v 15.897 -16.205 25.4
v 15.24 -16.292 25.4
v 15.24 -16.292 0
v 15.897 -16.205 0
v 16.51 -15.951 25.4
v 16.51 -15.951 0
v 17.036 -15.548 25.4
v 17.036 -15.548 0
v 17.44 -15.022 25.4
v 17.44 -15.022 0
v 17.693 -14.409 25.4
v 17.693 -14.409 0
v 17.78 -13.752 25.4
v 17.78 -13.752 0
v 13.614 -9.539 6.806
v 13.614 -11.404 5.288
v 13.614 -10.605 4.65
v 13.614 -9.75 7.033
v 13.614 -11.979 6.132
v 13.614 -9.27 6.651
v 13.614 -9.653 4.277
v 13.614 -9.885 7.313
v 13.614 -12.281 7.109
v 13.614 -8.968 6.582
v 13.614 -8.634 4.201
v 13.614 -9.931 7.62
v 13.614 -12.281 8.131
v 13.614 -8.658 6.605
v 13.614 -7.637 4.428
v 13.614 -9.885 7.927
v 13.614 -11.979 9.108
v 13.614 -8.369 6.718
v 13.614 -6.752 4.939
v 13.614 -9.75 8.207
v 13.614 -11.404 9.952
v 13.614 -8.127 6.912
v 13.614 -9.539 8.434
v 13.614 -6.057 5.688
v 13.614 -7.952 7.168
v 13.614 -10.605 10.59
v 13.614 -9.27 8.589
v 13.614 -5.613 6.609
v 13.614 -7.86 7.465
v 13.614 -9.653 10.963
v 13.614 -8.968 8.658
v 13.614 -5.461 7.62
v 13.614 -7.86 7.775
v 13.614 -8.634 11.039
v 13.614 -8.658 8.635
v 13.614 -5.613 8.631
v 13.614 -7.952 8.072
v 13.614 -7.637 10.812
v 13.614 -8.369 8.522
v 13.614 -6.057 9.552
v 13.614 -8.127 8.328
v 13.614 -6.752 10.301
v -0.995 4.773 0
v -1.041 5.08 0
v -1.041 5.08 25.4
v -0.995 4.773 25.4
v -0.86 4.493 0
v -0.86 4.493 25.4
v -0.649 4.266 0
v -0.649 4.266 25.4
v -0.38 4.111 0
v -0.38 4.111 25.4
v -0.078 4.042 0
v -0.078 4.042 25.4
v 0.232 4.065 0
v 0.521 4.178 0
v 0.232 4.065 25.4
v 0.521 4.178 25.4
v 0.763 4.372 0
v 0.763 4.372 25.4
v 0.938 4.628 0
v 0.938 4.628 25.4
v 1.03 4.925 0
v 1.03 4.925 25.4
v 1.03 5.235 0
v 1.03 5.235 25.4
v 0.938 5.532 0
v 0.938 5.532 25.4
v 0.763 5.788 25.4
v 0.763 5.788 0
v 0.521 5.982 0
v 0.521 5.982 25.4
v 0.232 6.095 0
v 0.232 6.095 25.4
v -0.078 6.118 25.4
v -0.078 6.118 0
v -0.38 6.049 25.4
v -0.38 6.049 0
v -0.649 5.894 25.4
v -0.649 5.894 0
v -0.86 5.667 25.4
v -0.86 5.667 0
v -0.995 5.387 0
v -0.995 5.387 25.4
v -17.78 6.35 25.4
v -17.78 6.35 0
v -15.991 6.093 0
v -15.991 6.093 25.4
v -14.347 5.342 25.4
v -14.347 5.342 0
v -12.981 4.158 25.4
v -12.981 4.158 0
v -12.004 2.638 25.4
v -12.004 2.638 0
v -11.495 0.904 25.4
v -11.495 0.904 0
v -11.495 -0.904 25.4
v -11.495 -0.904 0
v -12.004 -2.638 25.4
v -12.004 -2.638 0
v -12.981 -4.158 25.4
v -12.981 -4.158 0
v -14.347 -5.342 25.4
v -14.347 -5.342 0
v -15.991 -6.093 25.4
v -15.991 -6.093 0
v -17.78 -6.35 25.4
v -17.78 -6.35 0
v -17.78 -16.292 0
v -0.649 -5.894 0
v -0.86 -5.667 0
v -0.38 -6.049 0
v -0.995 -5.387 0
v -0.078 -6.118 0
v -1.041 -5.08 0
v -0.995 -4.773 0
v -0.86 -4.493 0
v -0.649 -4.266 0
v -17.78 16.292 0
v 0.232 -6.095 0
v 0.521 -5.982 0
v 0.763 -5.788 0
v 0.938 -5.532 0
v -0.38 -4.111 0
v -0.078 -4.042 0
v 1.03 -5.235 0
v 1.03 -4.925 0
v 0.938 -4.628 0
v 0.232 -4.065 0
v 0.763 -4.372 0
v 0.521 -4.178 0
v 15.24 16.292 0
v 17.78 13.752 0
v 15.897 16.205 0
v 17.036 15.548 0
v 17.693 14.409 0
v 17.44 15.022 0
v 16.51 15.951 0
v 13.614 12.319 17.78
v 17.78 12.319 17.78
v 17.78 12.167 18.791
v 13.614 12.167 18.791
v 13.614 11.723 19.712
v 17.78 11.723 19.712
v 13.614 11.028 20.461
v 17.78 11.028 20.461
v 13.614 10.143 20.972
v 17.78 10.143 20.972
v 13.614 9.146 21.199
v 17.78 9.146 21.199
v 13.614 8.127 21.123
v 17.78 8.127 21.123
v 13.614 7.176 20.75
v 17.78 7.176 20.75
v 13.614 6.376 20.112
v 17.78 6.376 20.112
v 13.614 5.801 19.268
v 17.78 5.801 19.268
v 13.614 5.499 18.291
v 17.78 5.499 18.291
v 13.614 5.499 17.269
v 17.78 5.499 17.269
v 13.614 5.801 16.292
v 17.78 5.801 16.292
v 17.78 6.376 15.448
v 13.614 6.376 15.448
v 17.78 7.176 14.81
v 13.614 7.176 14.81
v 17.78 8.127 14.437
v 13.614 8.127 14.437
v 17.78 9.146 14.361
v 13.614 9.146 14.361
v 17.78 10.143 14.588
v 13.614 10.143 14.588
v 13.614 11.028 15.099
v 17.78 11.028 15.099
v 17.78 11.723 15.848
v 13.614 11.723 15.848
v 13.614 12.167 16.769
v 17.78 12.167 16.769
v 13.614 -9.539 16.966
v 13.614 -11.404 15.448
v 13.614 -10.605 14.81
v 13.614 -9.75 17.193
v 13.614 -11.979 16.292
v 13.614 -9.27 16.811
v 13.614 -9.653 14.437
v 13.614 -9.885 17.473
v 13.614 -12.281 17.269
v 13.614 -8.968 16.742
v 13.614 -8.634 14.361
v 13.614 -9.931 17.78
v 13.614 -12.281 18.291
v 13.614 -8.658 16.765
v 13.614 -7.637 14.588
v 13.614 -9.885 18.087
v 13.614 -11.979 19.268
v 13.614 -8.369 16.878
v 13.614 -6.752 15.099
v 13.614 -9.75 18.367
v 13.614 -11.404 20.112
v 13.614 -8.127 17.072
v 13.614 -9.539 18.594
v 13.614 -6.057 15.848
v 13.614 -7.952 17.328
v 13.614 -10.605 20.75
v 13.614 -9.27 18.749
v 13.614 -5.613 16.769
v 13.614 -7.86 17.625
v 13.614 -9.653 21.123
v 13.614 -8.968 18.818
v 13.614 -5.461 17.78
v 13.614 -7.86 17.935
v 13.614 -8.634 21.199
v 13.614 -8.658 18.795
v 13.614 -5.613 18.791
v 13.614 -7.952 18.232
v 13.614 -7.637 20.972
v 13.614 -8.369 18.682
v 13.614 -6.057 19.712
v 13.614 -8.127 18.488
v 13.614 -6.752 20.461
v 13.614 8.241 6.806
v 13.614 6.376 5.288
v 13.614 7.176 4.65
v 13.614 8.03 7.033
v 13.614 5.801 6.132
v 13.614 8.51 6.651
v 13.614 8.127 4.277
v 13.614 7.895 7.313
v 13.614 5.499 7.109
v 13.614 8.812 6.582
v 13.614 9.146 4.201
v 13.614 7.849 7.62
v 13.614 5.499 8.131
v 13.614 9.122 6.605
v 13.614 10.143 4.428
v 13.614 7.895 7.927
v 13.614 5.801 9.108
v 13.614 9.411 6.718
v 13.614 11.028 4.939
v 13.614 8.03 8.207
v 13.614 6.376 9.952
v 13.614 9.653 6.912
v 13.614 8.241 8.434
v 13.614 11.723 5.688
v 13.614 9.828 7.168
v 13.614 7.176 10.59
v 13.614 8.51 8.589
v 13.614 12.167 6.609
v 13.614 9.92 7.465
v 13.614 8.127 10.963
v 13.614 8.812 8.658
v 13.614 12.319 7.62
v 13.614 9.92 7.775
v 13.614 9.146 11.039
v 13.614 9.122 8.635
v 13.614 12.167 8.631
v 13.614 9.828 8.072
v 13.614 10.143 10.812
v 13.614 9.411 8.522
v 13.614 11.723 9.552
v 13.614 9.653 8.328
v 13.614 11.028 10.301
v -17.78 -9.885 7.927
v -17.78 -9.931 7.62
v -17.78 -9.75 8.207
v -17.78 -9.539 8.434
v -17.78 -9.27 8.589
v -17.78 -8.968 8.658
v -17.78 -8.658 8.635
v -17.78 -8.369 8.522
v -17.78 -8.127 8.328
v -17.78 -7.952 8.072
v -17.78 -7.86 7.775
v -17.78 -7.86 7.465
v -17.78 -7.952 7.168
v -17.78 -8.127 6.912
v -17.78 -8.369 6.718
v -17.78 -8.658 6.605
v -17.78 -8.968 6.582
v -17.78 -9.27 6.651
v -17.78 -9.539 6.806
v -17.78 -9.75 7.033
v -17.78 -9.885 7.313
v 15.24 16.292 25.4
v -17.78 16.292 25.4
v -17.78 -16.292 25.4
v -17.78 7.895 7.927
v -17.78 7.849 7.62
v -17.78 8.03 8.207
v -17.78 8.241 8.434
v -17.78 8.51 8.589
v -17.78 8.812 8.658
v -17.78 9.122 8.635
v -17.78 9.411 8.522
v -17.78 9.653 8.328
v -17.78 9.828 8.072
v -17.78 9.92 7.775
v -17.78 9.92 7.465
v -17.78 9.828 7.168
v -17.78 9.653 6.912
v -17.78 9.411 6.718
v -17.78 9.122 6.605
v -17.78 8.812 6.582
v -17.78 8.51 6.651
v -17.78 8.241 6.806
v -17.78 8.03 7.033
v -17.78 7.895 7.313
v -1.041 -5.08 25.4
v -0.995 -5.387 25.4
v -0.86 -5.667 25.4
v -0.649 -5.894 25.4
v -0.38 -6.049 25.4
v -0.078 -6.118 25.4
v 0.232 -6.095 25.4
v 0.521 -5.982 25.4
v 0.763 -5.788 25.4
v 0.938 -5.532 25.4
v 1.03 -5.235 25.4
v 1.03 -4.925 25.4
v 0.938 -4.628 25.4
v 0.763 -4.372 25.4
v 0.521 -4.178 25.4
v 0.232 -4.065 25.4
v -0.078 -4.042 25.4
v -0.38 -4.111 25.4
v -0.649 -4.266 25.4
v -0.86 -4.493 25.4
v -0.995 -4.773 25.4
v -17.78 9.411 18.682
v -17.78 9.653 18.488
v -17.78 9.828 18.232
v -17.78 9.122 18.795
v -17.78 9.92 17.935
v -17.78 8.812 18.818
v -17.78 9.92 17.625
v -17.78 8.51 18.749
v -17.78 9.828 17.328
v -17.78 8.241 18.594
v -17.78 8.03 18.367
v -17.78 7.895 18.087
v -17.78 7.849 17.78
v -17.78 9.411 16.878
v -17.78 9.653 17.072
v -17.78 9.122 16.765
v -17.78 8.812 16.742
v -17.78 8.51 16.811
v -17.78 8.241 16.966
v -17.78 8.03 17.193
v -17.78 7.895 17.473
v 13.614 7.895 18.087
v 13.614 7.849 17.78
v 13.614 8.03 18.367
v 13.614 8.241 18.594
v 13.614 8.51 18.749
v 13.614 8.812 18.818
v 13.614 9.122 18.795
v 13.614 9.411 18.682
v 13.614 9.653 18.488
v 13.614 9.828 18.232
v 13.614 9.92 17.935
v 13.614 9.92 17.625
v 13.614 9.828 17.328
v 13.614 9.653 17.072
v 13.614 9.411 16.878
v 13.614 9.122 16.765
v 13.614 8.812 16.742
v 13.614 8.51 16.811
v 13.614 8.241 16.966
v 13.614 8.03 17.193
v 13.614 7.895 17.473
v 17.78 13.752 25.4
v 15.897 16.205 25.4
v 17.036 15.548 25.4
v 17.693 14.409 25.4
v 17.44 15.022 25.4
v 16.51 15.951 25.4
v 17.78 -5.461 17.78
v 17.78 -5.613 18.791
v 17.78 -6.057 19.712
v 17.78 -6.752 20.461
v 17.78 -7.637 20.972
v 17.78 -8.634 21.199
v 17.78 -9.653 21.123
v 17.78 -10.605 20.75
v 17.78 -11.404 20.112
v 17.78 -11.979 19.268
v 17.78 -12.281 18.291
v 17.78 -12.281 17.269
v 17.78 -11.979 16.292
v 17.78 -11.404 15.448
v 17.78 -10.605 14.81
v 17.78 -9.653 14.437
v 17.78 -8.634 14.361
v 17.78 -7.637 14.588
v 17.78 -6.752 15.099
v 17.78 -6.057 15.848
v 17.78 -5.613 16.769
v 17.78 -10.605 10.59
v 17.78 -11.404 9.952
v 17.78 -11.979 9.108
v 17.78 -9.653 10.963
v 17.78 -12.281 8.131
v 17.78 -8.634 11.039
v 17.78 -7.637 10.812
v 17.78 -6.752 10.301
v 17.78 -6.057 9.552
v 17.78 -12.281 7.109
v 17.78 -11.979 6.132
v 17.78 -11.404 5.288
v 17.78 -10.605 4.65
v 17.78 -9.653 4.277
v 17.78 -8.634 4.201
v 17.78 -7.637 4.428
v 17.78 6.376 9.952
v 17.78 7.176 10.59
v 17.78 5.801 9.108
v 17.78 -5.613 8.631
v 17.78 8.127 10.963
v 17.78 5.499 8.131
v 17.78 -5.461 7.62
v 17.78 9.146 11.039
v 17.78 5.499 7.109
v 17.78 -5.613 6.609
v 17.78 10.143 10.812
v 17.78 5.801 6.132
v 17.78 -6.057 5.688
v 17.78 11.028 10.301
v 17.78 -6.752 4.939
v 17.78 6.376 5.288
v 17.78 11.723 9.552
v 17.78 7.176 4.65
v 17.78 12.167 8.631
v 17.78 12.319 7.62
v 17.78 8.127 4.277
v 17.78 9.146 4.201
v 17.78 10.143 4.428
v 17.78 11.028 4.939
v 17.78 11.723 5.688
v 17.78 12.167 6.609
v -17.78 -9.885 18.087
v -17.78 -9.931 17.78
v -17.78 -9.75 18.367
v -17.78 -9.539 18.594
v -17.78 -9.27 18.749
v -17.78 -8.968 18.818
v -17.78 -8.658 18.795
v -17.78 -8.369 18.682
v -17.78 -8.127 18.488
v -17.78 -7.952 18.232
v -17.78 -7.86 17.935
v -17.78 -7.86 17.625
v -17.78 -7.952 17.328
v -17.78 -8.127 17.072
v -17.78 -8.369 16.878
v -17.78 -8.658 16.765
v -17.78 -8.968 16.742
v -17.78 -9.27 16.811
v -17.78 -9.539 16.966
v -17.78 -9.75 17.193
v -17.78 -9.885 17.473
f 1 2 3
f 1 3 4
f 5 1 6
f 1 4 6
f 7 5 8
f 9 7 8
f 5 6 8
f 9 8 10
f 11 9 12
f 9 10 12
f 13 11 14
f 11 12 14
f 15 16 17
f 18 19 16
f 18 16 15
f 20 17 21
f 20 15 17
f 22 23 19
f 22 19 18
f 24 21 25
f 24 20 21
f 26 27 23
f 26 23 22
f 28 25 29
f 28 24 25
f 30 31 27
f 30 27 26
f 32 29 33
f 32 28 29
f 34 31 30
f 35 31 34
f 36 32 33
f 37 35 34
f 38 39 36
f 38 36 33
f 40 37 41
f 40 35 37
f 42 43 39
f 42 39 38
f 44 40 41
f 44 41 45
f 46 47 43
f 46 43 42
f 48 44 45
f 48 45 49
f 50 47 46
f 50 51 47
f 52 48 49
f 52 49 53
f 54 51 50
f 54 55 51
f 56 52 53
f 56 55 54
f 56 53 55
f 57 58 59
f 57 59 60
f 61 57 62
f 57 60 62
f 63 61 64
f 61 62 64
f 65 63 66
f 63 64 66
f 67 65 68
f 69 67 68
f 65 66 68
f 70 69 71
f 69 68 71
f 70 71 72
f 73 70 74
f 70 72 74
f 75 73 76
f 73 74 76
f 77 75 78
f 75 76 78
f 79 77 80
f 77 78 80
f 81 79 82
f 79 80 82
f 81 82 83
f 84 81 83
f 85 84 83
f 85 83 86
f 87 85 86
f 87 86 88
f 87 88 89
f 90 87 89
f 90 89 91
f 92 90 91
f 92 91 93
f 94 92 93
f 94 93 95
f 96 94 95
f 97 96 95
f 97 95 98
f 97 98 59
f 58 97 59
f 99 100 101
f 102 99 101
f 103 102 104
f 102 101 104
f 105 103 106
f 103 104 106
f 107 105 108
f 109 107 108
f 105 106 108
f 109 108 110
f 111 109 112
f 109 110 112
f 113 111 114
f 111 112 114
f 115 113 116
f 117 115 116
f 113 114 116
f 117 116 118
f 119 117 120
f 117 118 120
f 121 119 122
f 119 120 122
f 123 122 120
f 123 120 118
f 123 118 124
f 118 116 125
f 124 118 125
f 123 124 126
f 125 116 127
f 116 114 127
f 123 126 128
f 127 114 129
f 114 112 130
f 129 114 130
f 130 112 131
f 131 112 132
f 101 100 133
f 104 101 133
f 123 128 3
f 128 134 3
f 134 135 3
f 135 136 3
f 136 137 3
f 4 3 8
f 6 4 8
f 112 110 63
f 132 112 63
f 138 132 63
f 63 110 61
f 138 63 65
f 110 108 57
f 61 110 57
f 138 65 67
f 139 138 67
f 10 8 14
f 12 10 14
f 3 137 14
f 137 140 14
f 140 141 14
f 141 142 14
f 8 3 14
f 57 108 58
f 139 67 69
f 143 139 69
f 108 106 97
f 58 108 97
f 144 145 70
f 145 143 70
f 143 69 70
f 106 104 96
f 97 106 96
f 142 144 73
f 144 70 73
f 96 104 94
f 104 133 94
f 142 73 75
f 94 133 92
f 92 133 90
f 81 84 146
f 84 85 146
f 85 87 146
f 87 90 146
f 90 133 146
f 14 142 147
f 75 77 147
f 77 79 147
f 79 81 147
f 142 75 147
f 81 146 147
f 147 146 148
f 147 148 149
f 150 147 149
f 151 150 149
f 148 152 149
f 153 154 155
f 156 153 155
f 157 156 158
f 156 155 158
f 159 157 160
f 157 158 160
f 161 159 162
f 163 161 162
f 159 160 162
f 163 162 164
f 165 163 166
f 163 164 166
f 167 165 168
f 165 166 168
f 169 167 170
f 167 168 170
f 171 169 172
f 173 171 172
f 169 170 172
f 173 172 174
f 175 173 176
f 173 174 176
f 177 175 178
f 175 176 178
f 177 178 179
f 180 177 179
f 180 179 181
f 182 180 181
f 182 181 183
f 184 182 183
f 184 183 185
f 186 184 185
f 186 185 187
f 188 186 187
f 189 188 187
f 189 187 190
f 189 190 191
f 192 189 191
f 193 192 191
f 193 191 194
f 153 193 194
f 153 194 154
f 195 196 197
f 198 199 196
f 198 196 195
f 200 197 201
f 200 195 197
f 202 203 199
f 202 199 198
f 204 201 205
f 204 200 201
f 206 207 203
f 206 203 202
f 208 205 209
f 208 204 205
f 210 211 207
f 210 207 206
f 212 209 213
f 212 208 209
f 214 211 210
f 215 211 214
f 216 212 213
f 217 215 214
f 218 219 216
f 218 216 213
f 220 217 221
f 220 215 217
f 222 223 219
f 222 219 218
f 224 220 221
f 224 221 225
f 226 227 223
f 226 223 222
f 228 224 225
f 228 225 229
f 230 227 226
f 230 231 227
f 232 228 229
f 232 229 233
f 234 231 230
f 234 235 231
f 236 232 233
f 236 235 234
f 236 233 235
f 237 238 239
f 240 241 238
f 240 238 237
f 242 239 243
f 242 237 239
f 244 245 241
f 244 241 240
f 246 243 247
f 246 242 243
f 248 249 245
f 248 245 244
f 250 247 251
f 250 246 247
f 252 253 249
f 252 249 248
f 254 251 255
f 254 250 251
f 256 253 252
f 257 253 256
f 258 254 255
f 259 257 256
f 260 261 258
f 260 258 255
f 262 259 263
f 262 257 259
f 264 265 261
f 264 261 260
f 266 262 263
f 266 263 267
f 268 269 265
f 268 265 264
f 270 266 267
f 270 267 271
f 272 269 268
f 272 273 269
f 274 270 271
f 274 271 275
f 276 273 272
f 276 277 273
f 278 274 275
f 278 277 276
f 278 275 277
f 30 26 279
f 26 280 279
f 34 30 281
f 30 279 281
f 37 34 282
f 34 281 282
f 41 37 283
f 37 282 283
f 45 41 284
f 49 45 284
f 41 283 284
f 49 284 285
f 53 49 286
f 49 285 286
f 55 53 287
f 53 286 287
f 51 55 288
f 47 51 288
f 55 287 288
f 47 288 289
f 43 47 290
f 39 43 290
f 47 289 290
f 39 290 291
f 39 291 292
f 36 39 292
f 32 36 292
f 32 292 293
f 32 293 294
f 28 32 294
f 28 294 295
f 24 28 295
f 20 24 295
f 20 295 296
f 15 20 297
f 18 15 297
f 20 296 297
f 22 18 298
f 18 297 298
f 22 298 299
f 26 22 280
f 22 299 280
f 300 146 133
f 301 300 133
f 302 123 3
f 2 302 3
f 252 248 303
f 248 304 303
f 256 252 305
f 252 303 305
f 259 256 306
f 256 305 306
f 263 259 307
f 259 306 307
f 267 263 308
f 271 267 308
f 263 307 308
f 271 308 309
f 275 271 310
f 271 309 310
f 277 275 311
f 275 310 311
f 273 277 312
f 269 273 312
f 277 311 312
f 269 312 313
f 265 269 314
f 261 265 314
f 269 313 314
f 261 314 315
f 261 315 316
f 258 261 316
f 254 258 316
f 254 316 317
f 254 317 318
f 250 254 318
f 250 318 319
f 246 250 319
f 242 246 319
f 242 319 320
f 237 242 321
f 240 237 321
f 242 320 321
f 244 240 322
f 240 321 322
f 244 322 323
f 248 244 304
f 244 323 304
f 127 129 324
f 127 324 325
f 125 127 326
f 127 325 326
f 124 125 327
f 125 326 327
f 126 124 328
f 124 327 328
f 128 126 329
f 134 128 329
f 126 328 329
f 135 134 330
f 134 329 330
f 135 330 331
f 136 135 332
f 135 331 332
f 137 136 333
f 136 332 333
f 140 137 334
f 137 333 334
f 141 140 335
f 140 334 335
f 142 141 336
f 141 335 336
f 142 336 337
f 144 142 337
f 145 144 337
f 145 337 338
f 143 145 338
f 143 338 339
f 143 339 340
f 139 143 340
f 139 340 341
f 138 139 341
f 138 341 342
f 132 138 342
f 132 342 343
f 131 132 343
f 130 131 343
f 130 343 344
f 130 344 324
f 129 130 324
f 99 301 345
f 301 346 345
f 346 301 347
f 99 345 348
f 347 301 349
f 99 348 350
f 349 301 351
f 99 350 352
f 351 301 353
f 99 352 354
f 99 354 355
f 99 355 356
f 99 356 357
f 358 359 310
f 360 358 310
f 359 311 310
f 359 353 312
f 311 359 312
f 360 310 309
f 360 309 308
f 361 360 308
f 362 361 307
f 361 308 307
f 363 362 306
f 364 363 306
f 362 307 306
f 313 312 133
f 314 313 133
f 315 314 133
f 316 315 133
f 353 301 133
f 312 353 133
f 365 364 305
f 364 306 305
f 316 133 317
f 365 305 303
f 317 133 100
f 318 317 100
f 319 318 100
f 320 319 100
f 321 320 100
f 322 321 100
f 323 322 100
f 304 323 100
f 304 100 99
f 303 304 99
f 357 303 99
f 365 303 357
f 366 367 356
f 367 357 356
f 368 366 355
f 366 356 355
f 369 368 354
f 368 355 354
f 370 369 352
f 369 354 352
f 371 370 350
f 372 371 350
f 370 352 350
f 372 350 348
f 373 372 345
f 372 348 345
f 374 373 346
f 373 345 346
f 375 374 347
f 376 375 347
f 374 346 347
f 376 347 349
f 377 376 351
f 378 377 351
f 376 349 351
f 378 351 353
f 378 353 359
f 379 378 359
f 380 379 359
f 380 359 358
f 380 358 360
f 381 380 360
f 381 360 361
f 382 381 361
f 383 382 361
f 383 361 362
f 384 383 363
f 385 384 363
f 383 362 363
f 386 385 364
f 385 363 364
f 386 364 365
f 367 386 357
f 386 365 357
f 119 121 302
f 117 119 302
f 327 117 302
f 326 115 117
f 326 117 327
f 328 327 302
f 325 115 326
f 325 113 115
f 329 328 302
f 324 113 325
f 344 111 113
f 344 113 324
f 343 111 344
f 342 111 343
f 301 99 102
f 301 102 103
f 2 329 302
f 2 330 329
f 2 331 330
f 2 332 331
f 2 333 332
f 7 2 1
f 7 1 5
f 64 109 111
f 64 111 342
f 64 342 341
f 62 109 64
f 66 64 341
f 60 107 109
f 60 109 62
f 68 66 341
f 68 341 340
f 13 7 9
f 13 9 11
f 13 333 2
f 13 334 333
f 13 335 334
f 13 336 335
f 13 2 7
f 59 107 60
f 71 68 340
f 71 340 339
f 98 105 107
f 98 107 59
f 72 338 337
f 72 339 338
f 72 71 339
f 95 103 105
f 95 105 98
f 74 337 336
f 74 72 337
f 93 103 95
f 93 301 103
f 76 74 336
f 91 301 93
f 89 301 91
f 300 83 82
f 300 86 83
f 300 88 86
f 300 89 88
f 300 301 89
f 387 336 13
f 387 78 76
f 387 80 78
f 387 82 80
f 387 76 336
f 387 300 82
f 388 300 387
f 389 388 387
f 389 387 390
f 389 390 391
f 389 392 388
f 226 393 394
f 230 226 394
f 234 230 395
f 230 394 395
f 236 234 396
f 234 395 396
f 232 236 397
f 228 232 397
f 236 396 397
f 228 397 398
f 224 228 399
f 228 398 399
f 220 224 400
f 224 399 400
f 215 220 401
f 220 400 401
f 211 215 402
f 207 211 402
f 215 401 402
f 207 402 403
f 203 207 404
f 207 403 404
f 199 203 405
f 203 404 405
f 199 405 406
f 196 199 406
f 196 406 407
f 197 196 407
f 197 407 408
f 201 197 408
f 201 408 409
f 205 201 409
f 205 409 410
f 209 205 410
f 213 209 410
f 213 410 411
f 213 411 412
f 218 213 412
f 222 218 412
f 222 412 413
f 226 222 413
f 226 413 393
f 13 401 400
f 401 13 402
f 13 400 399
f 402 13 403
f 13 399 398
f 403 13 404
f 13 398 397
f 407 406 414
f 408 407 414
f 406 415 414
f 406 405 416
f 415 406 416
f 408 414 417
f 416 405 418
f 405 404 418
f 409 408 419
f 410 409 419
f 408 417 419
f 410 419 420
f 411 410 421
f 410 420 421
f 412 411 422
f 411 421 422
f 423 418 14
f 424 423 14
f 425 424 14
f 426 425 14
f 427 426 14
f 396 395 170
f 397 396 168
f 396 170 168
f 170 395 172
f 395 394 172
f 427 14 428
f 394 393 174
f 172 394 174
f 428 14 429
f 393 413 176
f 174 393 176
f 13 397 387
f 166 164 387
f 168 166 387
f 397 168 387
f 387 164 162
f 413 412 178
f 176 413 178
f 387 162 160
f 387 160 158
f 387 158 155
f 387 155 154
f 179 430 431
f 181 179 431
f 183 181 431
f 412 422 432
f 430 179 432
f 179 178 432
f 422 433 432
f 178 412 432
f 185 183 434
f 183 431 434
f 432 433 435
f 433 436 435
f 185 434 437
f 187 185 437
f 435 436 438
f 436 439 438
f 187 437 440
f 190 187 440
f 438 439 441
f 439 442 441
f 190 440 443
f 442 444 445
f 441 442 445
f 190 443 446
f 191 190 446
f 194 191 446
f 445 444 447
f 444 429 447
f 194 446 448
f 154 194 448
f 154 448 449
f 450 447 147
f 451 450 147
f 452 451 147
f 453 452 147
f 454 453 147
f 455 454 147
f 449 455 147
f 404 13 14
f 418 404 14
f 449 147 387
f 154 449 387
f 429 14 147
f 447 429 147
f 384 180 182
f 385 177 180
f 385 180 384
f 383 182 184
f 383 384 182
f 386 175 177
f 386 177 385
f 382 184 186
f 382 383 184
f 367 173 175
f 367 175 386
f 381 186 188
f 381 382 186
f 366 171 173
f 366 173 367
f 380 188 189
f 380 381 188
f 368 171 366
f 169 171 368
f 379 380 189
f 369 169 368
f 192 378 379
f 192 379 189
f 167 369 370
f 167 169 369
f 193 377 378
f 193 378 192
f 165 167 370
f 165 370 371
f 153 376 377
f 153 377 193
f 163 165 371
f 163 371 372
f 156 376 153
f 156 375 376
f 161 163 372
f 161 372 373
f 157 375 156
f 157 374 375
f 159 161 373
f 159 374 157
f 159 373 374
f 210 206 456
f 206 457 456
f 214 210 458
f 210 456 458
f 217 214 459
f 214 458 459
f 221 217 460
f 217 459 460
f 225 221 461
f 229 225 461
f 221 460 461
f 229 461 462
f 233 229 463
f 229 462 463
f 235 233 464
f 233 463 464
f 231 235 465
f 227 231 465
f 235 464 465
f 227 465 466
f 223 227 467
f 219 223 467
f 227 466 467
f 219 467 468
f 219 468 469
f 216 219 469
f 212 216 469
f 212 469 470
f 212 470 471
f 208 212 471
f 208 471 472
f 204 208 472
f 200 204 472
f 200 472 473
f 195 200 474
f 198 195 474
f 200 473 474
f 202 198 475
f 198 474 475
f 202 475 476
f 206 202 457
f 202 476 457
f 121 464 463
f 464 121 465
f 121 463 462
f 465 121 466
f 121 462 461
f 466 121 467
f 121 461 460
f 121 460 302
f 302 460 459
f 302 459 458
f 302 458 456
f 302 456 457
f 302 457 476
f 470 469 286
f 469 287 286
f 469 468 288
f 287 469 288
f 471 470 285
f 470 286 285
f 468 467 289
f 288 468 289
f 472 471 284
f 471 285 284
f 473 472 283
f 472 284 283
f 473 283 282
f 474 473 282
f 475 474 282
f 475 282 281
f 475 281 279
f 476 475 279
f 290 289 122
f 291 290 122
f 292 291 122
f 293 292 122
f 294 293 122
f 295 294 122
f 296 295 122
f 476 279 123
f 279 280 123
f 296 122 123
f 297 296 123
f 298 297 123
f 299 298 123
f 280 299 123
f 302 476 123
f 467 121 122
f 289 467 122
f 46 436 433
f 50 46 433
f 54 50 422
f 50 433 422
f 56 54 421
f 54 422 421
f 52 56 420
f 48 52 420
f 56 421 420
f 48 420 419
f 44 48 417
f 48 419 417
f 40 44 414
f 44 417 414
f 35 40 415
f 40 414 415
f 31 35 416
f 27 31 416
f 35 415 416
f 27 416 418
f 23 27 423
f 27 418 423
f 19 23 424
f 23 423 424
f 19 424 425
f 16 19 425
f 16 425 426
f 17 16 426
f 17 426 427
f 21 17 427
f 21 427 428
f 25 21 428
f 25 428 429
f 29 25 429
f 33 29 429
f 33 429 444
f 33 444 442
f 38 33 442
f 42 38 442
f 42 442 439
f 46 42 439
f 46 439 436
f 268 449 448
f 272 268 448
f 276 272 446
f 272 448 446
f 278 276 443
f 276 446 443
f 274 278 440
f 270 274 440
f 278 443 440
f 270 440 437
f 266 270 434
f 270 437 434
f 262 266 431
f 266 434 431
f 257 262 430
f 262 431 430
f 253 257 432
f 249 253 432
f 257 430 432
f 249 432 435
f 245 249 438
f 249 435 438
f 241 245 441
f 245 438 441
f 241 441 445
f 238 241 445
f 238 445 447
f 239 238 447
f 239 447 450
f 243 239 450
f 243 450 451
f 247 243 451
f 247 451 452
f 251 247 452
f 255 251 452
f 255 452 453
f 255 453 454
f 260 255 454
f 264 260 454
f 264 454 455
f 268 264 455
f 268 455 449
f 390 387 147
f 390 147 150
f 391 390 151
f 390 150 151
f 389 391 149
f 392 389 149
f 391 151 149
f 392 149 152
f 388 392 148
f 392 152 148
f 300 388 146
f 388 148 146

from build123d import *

# Parameters (mm, degrees)
F1_DEPTH       = 25.4
F3_D           = 2.0828
F3_CBORE_D     = 6.858
F3_CBORE_DEPTH = 4.1656
F5_D           = 2.0828


with BuildPart() as f1:
    # F0 (on Top) → F1 (new body)
    with BuildSketch(Plane.XY):
        with BuildLine():
            Line((-17.78, -6.35), (-17.78, -16.29156))
            Line((-17.78, -16.29156), (15.24, -16.29156))
            ThreePointArc((15.24, -16.29156), (17.036051, -15.547611), (17.78, -13.75156))
            Line((17.78, -13.75156), (17.78, 13.75156))
            ThreePointArc((17.78, 13.75156), (17.036051, 15.547611), (15.24, 16.29156))
            Line((15.24, 16.29156), (-17.78, 16.29156))
            Line((-17.78, 16.29156), (-17.78, 6.35))
            ThreePointArc((-17.78, 6.35), (-11.43, 0), (-17.78, -6.35))
        make_face()
    extrude(amount=F1_DEPTH)

    # F3 (through all)
    with Locations(Plane.YZ.offset(17.78)):
        with Locations((-8.89, 17.78), (-8.89, 7.62), (8.89, 17.78), (8.89, 7.62)):
            CounterBoreHole(F3_D / 2, F3_CBORE_D / 2, F3_CBORE_DEPTH)

    # F5 (through all)
    with Locations(Plane(origin=(0, 0, 0), x_dir=(1, 0, 0), z_dir=(0, 0, -1))):
        with Locations((0, 5.08), (0, -5.08)):
            Hole(F5_D / 2)


solid = f1.part
